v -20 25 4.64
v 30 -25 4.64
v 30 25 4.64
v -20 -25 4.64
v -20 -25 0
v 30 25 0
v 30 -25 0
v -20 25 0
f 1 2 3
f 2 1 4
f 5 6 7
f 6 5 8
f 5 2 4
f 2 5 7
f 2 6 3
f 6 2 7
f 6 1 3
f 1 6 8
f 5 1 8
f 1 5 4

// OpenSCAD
// file: ../config.scad
/*
 * config
 *
 * Copyright 2013 <b@Zi.iS>
 * License CC BY 3.0
 */

$fa = 1;
$fs = 1;
preview = 1;

// preview colors
color_steal = [.8,.8,.8];
color_wood = [.3,.3,0];
color_print = [0,.8,0];

// metric bolt sizes
function m_hole(size) = size*1.1/2;
function m_pilot(size) = size*.9/2;

mounting_bolt = 3;

// slightly move and slightly elongate objects in preview to overcome scad rounding errors
module e() {
	if(preview==1) {
		translate([
			0,
			0,
			-.1
		]) {
			scale([
				1,
				1,
				1.1
			]) {
				child();
			}
		}
	} else {
		child();
	}
}

module m_washer(
	size = 3
) {
	color(color_steal) {
		difference() {
			cylinder(
				r = size/2*2,
				h = size*.2
			);
			e() cylinder(
				r = size/2,
				h = size*.2
			);
		}
	}
	translate([
		0,
		0,
		size*.2
	]) {
		child();
	}
}

module m_nut(
	size = 3
) {
	color(color_steal) {
		difference() {
			cylinder(
				r = size*1.8/2,
				h = size*.8,
				$fn = 6
			);
		}
	}
	translate([
		0,
		0,
		size*.8
	]) {
		child();
	}
}

module m_nylock(
	size = 3
) {
	color(color_steal) {
		difference() {
			cylinder(
				r = size*1.8/2,
				h = size,
				$fn = 6
			);
		}
	}
	translate([
		0,
		0,
		size
	]) {
		child();
	}
}

module screw(
	r = 1,
	h = 1,
	pitch = 5,
) {
	linear_extrude(
		height = h,
		twist = -h/pitch*360
	) {
		translate([pitch/5,0,0]) { //H=.2*p works better in plastic then ISO's H=.866*p
			circle(
				r=r 
			);
		}
	}
}

fan40 = [
	40,			//width/length
	10,			//height
	32,			//bolt pitch
	3,			//bolt
];

lm8uu = [
	15.2/2,	//outside
	8/2,	//inside
	26,		//length
];
// main file
/*
 * x carriage plate
 *
 * Copyright 2013 <b@Zi.iS>
 * License CC BY 3.0
 */

include <../config.scad>

x_carriage_plate();

module x_carriage_plate(
	heads = 17,
	bars = 50
) {
	color([.5,.5,0]) {
		translate([
			-20,
			-bars/2,
			0
		]) {
			cube([
				50,
				bars,
				4.64
			]);
		}
	}
}
